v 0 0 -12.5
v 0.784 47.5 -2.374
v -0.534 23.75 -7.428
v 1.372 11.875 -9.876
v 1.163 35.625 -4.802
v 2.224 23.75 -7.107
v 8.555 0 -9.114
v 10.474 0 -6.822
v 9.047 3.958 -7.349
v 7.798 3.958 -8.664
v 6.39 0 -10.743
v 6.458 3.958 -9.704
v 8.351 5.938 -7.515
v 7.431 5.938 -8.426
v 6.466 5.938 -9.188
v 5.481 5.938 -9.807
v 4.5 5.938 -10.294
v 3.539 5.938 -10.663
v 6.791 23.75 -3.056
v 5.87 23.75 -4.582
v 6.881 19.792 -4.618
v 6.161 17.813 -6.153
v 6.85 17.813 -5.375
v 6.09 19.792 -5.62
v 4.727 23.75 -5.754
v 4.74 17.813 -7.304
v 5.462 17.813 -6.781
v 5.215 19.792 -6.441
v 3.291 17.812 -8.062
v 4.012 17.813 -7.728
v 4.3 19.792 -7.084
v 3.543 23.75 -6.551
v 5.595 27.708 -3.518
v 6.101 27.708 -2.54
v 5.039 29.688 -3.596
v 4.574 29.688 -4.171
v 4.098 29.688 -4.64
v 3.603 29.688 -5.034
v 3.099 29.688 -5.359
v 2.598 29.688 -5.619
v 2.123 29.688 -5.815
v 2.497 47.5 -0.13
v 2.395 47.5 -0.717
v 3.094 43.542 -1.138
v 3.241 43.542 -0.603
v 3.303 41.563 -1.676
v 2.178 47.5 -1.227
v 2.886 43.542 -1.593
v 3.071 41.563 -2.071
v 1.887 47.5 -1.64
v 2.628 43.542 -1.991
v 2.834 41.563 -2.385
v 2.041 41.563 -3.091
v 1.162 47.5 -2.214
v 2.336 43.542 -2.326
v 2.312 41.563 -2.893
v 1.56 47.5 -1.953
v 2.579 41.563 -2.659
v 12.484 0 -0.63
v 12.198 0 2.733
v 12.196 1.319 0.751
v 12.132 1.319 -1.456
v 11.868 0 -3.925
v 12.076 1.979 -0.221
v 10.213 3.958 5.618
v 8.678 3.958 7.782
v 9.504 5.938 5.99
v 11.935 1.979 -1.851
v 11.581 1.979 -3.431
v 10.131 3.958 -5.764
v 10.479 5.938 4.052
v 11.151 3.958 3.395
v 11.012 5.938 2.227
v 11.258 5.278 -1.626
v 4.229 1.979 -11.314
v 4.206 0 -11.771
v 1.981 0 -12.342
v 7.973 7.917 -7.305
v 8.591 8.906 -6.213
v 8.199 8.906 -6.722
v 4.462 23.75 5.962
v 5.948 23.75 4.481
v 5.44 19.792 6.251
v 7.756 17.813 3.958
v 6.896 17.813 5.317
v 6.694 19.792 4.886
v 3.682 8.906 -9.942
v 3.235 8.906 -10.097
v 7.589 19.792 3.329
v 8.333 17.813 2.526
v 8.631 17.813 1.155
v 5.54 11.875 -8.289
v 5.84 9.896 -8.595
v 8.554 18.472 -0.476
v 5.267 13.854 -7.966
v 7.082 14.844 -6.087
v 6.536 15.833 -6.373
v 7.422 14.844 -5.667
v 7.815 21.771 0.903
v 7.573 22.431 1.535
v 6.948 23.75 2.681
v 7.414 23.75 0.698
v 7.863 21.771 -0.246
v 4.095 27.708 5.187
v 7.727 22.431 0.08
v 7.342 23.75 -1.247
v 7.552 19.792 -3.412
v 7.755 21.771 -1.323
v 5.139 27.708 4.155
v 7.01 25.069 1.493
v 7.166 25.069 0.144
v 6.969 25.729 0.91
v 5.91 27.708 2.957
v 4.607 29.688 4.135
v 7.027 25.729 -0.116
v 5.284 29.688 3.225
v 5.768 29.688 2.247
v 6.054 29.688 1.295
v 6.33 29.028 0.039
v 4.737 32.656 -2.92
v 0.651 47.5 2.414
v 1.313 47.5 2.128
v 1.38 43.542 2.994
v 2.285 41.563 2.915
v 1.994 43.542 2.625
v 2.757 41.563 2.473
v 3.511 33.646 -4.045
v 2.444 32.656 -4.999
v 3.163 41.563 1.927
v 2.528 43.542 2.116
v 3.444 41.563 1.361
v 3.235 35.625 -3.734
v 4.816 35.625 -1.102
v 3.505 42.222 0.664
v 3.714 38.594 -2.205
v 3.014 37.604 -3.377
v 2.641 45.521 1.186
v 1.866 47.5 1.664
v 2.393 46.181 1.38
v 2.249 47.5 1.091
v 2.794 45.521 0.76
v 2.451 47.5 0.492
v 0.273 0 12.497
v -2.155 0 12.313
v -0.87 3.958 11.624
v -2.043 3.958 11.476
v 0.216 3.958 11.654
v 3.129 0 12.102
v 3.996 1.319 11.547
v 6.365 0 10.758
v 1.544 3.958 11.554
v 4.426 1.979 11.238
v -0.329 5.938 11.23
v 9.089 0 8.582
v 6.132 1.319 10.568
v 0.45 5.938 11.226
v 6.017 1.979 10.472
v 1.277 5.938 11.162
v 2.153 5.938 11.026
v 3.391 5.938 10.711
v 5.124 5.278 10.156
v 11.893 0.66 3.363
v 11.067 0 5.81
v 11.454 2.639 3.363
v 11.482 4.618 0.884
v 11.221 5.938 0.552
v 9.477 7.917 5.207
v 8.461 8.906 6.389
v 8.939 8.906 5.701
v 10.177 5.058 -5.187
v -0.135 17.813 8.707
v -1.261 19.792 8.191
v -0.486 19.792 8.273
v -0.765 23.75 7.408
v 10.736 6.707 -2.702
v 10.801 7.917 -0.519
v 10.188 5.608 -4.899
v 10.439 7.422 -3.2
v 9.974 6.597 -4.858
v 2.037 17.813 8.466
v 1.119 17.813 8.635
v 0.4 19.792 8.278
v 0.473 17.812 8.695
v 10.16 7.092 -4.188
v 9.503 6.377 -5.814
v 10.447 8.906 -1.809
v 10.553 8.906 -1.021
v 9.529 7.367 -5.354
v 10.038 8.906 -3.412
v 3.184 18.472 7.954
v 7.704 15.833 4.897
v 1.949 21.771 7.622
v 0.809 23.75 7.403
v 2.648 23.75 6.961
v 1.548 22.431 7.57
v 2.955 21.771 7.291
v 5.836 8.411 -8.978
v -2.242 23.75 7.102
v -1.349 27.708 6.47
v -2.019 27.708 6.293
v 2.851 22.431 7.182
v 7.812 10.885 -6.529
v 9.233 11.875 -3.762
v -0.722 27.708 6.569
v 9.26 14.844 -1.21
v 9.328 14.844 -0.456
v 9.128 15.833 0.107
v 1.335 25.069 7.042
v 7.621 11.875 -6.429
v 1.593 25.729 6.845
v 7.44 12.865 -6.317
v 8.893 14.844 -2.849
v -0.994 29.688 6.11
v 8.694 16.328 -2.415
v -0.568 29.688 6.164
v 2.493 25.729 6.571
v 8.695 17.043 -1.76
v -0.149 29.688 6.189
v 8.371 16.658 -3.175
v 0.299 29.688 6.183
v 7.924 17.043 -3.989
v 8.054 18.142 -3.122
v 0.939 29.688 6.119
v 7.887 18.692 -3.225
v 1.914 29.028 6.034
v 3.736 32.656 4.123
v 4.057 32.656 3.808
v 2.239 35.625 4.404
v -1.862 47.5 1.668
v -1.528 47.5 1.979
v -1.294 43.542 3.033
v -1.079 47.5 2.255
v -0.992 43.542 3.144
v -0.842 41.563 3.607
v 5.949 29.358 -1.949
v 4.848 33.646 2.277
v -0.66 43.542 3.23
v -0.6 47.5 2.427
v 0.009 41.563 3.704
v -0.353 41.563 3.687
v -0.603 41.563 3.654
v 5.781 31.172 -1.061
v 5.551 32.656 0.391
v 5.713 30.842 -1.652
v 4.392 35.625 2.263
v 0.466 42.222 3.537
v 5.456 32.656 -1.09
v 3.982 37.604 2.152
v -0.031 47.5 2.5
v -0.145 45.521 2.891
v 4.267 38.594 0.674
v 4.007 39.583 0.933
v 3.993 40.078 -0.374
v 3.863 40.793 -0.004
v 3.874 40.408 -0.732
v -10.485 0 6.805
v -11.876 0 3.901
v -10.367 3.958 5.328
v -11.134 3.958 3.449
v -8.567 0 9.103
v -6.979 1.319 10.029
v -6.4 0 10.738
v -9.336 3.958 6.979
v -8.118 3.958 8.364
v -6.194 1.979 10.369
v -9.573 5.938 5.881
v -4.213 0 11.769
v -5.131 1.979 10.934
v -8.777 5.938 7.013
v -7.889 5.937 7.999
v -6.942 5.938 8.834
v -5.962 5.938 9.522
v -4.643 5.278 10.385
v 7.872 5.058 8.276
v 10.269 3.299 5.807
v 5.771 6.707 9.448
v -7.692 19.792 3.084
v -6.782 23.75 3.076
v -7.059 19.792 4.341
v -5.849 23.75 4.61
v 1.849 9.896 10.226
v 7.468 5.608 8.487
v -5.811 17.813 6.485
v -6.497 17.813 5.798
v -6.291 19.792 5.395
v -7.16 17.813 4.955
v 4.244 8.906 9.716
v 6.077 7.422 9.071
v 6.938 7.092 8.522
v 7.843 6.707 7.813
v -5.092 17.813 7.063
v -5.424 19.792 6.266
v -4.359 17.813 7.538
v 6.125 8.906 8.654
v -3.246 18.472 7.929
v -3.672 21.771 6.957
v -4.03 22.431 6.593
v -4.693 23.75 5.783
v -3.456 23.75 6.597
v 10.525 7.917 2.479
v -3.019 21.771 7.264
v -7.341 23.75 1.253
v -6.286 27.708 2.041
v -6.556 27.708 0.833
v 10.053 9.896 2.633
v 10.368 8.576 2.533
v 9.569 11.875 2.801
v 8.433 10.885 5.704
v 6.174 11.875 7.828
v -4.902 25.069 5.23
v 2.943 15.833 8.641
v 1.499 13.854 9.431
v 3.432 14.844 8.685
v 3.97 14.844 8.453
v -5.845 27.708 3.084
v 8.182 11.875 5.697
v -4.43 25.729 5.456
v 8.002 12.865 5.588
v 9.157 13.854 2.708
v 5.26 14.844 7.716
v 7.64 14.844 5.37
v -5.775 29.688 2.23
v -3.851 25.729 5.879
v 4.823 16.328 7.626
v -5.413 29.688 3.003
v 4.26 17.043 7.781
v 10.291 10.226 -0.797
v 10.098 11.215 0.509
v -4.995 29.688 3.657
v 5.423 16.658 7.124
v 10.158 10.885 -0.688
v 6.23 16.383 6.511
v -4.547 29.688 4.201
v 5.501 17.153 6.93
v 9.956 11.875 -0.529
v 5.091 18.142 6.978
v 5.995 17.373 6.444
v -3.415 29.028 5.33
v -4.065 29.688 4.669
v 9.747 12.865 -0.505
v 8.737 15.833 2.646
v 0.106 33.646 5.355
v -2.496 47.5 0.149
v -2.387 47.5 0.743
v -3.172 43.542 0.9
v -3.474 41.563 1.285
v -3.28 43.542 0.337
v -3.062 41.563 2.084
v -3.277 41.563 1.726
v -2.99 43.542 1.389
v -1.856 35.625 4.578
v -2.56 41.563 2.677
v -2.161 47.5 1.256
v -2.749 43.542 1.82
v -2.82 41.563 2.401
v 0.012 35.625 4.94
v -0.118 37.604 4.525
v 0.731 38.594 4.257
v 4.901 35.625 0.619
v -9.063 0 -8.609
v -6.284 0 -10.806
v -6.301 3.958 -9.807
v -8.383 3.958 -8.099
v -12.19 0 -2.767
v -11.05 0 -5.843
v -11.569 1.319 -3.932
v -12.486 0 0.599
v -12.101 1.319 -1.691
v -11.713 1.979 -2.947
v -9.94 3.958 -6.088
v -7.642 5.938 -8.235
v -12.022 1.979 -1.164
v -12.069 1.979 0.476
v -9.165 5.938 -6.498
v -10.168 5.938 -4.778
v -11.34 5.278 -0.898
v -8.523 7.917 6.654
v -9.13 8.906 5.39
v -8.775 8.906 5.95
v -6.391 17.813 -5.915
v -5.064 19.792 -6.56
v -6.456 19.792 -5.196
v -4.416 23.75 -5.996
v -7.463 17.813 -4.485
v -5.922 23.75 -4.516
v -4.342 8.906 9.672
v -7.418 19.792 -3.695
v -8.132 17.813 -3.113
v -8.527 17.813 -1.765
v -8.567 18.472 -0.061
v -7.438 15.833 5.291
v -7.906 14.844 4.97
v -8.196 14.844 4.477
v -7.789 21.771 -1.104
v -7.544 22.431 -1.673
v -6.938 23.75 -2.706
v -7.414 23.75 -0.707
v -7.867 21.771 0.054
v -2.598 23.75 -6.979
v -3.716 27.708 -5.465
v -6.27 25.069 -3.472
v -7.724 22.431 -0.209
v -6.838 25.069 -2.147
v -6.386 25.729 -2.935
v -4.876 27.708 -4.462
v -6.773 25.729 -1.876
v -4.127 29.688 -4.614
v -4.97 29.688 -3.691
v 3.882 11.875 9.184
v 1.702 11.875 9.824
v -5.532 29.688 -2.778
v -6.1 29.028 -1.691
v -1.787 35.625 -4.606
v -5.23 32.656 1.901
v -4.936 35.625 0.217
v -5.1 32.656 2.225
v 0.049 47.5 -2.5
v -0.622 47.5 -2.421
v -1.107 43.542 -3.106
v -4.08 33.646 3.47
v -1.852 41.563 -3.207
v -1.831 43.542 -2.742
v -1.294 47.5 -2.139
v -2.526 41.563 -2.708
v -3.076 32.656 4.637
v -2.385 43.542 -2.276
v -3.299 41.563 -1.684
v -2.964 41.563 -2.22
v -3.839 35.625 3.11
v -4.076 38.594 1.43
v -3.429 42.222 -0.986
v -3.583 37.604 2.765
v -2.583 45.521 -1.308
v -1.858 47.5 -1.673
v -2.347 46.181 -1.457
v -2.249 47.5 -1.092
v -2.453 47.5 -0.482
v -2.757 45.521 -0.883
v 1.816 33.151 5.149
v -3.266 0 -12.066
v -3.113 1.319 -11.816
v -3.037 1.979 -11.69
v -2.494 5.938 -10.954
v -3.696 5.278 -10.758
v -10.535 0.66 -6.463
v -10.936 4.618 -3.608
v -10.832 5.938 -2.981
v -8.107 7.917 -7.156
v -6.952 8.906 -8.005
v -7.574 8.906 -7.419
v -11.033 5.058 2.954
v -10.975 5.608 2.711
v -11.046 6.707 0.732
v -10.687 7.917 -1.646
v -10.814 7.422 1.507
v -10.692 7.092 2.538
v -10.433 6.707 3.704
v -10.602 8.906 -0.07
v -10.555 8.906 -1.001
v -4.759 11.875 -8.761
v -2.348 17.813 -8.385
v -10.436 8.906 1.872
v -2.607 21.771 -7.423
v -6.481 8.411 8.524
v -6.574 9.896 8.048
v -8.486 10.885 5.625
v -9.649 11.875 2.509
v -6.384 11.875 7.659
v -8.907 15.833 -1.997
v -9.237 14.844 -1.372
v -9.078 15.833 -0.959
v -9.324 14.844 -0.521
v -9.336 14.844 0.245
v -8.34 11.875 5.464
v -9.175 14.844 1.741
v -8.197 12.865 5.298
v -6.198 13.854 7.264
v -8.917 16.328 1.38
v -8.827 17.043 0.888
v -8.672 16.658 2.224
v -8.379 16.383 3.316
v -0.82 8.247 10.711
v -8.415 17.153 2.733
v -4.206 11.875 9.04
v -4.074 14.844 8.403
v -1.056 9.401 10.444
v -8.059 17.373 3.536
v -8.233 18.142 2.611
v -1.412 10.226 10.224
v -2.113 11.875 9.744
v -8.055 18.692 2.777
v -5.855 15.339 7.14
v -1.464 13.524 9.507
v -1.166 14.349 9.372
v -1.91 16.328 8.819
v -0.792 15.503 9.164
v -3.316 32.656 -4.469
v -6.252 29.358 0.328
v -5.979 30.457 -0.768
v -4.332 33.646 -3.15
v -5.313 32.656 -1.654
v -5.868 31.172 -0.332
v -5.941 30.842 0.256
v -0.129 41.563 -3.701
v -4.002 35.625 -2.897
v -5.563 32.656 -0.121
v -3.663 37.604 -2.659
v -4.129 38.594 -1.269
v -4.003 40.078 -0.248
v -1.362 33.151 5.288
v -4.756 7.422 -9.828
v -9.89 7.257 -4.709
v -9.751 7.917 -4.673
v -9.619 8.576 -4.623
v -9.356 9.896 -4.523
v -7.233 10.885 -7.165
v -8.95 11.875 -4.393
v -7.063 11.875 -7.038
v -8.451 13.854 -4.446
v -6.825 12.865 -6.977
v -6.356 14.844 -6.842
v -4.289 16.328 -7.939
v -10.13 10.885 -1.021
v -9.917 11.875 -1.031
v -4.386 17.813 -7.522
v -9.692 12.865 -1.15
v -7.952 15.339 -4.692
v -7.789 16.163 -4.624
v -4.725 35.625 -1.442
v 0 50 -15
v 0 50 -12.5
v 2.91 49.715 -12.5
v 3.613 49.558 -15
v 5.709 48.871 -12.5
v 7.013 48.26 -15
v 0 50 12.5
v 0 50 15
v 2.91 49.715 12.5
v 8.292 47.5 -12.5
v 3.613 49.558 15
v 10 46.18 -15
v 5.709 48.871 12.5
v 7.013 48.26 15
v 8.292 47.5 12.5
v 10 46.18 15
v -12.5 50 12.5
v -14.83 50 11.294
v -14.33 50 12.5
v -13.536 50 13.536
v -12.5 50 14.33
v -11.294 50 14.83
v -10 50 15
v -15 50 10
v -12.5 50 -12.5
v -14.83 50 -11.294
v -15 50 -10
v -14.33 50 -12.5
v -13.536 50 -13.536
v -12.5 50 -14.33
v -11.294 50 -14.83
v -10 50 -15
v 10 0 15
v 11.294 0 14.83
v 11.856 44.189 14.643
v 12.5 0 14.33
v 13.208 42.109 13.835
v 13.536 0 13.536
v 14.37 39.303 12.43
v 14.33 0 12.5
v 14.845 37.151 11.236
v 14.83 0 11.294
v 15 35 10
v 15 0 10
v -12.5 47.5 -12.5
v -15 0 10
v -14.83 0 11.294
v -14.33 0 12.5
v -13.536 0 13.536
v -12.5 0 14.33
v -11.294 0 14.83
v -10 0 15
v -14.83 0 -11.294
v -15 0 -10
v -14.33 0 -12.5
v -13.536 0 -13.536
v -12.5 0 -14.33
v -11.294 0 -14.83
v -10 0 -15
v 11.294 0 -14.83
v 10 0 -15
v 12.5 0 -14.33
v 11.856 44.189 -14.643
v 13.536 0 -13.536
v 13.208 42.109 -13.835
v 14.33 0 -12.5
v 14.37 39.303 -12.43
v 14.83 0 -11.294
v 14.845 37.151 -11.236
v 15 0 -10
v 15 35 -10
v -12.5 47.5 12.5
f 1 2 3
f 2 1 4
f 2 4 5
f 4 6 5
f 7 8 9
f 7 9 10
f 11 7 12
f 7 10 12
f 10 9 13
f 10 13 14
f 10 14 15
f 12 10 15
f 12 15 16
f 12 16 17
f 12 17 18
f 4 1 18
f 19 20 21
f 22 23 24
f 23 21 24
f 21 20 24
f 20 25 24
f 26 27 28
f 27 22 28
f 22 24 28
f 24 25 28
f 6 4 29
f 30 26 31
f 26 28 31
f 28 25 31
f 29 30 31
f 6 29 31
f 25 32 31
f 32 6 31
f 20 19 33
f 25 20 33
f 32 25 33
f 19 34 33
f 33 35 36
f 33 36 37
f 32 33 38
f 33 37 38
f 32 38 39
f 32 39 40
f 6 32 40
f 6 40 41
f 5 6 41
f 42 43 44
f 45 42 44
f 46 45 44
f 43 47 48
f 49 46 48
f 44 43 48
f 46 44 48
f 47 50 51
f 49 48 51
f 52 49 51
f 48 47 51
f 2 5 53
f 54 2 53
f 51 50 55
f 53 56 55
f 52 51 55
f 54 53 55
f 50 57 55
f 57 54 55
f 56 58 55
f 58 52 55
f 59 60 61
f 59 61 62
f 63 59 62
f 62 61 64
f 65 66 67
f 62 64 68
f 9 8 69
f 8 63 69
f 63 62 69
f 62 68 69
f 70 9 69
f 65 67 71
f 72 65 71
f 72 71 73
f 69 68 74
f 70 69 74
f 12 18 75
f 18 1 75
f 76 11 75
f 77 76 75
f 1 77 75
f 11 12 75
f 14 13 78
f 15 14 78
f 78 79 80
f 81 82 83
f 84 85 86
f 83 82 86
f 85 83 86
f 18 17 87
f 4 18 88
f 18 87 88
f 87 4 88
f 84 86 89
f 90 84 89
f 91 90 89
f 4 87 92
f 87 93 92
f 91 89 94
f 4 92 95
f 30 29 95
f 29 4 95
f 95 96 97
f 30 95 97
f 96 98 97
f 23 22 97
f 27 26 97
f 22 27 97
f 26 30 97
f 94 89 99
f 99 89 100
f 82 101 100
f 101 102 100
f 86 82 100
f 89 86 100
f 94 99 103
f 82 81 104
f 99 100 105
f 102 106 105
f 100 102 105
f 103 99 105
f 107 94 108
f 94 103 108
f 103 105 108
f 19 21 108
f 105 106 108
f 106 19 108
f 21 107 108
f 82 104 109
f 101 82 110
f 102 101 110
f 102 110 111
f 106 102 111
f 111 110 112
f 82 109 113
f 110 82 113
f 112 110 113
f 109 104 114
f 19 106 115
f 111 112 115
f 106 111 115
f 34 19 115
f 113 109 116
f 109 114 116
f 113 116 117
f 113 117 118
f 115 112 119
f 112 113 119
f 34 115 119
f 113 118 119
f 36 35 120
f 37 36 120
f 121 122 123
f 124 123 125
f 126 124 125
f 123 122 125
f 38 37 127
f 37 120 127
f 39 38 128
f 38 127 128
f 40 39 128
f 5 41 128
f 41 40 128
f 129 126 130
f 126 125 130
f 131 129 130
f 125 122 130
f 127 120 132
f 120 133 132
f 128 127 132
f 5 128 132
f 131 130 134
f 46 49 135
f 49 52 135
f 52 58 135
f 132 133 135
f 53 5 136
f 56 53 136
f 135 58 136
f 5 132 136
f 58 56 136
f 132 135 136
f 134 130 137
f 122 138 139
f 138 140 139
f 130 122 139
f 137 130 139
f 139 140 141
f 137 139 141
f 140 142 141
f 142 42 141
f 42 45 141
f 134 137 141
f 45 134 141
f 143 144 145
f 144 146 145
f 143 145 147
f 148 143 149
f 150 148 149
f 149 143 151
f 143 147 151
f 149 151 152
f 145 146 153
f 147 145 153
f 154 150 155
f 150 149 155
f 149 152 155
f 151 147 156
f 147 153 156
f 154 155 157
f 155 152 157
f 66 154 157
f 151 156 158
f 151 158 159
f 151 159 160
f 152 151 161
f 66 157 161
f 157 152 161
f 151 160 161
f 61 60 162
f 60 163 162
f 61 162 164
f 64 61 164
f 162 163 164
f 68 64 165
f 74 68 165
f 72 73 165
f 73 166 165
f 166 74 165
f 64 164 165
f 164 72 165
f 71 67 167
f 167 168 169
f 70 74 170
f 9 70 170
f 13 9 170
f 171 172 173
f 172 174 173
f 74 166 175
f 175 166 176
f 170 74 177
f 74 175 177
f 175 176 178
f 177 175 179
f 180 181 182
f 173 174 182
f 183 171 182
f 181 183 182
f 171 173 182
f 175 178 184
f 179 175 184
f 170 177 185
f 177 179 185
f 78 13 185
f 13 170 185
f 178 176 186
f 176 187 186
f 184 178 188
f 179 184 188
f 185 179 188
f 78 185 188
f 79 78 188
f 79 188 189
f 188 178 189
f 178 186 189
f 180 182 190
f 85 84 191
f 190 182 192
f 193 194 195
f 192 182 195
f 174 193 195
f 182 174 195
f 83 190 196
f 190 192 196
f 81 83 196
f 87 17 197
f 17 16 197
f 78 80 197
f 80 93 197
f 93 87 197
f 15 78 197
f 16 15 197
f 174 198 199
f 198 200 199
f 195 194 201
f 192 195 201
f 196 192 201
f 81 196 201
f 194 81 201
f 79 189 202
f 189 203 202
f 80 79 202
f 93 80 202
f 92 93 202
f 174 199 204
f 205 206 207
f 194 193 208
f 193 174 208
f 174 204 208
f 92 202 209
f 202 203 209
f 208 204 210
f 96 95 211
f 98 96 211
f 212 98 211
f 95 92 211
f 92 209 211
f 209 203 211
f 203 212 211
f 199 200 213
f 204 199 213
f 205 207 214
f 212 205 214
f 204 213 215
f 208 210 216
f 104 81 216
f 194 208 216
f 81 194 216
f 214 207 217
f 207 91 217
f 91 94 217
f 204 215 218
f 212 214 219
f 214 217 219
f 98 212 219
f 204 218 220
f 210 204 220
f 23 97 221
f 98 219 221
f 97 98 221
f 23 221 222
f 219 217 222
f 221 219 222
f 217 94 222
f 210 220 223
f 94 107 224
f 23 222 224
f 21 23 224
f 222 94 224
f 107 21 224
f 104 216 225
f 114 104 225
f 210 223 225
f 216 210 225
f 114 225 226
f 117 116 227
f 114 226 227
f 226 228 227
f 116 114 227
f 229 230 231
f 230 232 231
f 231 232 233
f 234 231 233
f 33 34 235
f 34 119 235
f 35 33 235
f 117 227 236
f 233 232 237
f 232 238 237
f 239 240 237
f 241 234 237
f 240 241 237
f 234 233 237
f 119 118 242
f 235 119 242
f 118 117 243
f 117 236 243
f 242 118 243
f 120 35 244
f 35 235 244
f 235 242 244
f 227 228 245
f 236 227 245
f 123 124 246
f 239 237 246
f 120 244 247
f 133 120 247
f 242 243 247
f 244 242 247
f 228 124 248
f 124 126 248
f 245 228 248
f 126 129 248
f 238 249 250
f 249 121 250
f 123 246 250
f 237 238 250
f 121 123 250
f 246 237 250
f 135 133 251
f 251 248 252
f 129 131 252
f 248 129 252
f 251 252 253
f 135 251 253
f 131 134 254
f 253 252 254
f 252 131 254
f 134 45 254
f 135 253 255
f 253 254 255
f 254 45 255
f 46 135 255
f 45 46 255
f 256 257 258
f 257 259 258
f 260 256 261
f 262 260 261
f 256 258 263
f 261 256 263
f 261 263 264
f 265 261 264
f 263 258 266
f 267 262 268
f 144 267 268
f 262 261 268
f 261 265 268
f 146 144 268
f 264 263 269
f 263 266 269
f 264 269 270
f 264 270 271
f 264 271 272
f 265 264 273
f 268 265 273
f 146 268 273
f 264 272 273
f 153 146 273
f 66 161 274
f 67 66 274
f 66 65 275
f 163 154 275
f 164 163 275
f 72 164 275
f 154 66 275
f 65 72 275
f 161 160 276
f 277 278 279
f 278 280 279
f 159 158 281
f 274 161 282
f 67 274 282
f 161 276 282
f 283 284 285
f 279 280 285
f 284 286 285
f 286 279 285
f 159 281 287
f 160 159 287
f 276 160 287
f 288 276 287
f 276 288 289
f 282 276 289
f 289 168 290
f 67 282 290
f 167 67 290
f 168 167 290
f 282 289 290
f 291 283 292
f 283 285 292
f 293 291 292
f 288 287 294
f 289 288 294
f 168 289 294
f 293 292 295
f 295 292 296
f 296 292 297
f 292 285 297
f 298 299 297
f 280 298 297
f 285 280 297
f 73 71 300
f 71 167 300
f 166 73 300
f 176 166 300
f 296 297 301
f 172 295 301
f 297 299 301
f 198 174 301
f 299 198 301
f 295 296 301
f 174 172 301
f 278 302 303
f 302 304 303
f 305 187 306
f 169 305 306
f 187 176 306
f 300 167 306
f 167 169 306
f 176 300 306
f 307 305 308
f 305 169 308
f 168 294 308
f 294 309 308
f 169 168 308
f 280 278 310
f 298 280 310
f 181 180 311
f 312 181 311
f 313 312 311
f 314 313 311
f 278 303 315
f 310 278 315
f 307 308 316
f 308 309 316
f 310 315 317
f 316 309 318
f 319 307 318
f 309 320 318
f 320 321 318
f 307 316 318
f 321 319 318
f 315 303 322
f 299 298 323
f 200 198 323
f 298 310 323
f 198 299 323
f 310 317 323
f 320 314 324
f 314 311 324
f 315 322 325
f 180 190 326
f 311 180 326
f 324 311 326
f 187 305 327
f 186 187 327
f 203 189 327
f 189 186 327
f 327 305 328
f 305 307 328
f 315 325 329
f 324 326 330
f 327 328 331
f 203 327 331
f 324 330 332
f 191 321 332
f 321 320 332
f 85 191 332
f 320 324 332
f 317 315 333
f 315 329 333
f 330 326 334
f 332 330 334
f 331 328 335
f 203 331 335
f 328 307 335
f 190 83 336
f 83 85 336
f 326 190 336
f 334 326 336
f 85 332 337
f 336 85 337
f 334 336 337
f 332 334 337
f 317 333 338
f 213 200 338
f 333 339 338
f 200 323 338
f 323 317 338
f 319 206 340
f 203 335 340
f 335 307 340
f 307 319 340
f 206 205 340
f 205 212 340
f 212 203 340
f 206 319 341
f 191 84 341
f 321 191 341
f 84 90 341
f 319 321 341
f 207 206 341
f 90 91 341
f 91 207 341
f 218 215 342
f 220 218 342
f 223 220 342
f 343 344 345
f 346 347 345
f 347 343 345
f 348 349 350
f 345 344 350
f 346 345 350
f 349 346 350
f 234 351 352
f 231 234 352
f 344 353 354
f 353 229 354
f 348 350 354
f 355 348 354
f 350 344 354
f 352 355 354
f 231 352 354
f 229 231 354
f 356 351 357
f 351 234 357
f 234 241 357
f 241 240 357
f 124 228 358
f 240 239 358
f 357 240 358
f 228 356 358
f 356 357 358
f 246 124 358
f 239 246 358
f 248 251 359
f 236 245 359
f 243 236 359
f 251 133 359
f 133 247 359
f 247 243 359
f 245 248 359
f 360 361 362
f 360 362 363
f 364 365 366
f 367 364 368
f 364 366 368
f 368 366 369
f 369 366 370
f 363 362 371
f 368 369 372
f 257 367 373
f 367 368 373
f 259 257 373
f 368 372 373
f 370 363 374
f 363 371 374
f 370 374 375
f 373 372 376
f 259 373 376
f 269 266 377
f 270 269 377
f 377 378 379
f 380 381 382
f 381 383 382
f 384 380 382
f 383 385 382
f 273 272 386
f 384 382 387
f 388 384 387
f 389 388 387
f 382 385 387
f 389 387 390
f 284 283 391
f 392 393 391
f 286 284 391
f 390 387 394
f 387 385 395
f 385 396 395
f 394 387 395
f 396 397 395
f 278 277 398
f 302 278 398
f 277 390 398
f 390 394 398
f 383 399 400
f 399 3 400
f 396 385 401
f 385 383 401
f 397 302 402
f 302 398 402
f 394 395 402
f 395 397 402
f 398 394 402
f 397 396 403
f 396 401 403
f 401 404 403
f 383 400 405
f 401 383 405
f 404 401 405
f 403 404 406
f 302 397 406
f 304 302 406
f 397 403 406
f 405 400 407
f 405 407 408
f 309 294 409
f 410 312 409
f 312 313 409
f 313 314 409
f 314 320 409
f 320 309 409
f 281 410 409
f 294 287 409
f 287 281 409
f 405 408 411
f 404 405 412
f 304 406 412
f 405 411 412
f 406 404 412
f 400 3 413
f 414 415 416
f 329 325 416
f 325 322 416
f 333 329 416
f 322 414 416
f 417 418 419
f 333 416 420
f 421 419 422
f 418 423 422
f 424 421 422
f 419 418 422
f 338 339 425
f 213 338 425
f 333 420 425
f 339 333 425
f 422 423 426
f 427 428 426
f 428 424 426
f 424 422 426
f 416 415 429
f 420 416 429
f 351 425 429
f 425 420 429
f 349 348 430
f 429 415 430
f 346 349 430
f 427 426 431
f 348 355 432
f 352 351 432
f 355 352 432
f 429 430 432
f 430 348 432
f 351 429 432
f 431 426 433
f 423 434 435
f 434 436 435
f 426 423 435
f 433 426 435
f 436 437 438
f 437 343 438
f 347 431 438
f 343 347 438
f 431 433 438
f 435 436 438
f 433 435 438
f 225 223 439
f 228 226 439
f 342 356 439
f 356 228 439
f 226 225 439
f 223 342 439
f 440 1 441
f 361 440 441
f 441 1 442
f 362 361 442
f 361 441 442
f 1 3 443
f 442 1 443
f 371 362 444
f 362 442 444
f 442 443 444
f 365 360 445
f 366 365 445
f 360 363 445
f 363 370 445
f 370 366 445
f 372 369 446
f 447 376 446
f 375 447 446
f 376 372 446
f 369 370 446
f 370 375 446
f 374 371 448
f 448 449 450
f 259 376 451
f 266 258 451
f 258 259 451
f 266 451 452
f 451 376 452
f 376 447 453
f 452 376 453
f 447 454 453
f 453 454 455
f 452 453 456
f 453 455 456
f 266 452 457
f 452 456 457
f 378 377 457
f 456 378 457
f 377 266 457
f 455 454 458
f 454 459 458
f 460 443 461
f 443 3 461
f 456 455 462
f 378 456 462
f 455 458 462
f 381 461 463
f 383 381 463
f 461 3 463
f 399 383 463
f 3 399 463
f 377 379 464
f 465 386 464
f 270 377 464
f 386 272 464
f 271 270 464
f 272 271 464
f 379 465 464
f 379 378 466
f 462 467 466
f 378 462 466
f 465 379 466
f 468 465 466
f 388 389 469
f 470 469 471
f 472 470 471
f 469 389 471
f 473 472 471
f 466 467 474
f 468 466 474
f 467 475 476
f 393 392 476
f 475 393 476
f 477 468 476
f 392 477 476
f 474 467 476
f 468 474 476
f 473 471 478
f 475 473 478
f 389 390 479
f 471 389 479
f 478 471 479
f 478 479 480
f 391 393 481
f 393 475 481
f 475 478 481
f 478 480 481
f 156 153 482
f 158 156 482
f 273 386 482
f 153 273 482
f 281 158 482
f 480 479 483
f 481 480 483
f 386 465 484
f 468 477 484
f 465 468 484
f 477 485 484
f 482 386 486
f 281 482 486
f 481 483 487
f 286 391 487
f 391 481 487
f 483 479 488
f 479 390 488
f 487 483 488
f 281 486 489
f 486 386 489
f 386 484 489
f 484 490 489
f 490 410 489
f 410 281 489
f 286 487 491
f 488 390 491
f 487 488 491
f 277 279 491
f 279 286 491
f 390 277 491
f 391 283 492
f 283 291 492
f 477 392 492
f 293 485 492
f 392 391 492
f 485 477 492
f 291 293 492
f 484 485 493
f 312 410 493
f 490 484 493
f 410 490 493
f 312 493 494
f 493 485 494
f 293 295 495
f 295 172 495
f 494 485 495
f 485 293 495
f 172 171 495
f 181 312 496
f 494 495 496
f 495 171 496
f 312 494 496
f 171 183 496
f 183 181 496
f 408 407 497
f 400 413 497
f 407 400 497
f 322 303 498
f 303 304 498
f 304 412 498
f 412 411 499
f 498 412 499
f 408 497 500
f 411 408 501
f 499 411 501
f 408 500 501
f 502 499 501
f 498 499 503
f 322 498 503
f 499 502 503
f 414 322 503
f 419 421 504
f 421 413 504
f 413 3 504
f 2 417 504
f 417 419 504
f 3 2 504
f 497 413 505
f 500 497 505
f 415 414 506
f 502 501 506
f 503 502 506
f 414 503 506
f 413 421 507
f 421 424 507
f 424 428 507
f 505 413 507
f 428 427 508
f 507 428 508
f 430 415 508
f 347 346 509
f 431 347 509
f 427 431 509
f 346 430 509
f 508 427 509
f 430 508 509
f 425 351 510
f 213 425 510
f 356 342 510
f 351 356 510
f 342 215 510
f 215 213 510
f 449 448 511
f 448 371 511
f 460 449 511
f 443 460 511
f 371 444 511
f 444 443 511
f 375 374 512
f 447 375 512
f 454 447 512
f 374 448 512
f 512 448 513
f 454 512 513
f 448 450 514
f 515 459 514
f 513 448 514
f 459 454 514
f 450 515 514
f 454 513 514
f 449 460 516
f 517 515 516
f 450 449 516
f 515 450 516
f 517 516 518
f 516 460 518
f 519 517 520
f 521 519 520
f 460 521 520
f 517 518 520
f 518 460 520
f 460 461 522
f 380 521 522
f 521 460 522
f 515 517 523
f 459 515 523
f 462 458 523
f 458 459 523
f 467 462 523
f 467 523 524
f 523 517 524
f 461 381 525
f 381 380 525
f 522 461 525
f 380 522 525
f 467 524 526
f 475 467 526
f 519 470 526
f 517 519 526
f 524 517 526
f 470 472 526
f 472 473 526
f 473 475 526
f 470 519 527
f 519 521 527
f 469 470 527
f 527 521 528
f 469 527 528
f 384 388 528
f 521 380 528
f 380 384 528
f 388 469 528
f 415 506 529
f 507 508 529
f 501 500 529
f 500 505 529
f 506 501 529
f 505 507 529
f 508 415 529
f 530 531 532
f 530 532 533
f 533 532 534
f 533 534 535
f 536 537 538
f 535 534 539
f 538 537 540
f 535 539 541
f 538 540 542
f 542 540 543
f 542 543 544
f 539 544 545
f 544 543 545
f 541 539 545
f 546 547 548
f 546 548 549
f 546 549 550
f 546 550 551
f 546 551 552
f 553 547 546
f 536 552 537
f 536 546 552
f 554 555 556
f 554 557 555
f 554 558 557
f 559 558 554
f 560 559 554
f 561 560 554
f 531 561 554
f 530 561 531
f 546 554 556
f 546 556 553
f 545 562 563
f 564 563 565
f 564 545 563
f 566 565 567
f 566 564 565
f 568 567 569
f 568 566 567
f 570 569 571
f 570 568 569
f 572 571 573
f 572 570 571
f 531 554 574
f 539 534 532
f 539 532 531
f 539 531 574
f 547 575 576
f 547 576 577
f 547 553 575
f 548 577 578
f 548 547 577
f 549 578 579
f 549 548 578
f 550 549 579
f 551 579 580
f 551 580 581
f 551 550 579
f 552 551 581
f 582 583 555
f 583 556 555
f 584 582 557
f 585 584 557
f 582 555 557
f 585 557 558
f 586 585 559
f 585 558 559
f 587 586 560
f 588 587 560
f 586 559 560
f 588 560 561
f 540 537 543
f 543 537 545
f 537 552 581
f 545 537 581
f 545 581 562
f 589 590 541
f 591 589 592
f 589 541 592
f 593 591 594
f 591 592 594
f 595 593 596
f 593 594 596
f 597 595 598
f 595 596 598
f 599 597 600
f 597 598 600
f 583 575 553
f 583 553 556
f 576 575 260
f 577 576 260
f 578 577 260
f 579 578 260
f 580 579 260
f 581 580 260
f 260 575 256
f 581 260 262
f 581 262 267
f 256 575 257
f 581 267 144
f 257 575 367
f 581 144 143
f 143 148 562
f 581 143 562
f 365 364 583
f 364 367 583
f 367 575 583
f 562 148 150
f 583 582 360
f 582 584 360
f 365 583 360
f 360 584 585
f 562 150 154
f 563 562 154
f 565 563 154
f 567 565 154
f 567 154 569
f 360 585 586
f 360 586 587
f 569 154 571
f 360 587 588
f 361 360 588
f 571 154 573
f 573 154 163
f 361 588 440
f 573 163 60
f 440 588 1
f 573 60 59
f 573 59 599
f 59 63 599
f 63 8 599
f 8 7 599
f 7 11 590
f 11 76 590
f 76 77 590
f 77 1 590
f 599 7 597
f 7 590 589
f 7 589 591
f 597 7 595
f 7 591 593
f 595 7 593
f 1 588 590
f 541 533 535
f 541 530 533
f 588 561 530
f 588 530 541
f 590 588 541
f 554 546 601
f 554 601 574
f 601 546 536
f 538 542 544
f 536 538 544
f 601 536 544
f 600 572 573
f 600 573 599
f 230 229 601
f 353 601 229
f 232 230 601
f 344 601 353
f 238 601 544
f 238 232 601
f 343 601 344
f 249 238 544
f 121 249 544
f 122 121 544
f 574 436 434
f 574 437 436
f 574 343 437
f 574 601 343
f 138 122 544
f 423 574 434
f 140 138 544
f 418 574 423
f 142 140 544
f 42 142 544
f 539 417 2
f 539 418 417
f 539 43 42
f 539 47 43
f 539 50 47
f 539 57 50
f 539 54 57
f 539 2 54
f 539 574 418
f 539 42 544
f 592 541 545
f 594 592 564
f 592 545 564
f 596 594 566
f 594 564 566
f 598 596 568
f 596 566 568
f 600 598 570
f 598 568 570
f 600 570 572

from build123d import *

# Parameters (mm, degrees)
SKETCH2_W           = 30
SKETCH2_H           = 30
BOSS_EXTRUDE1_DEPTH = 50
SKETCH3_W           = 25
SKETCH3_H           = 25
CUT_EXTRUDE1_DEPTH  = 2.5
FILLET1_R           = 5
CUT_EXTRUDE2_DEPTH  = 61.207972969


with BuildPart() as part:
    # Sketch2 → Boss-Extrude1 (new body)
    with BuildSketch(Plane(origin=(0, 0, 0), x_dir=(1, 0, 0), z_dir=(0, 1, 0))):
        Rectangle(SKETCH2_W, SKETCH2_H)
    extrude(amount=BOSS_EXTRUDE1_DEPTH)

    # Sketch3 → Cut-Extrude1 (cut)
    with BuildSketch(Plane(origin=(0, 50, 0), x_dir=(1, 0, 0), z_dir=(0, 1, 0))):
        Rectangle(SKETCH3_W, SKETCH3_H)
    extrude(amount=-CUT_EXTRUDE1_DEPTH, mode=Mode.SUBTRACT)

    # Fillet1
    fillet1_edges = [part.edges().sort_by_distance(p)[0] for p in [
        (15, 25, 15),
        (-15, 25, 15),
        (-15, 25, -15),
        (15, 25, -15),
    ]]
    fillet(fillet1_edges, radius=FILLET1_R)

    # Cut-Loft2: read off the stored shape, not the designer's step
    # Cut-Loft2: loft between two sections, ruled curve by curve
    cut_loft2_from = [
        Edge.make_bspline([(0, 0, -12.5), (-25, 0, -12.5), (-25, 0, 12.5), (0, 0, 12.5), (25, 0, 12.5), (25, 0, -12.5), (0, 0, -12.5)], [0, 0, 0, 0, 0.5, 0.5, 0.5, 1, 1, 1, 1], 3, [1, 0.333333333, 0.333333333, 1, 0.333333333, 0.333333333, 1]),
    ]
    cut_loft2_to = [
        Edge.make_bspline([(0.784484005, 47.5, -2.373728048), (-3.962972092, 47.5, -3.942696057), (-5.531940101, 47.5, 0.804760039), (-0.784484005, 47.5, 2.373728048), (3.962972092, 47.5, 3.942696057), (5.531940101, 47.5, -0.804760039), (0.784484005, 47.5, -2.373728048)], [0, 0, 0, 0, 0.5, 0.5, 0.5, 1, 1, 1, 1], 3, [1, 0.333333333, 0.333333333, 1, 0.333333333, 0.333333333, 1]),
    ]
    cut_loft2 = Solid(Shell([*[Face.make_surface_from_curves(cut_loft2_from[k], cut_loft2_to[k]) for k in range(1)], Face(Wire(cut_loft2_from)), Face(Wire(cut_loft2_to))]))
    add(cut_loft2, mode=Mode.SUBTRACT)

    # Sketch9 → Cut-Extrude2 (cut, through all)
    with BuildSketch(Plane.XY.offset(15)):
        with BuildLine():
            Line((15, 50), (10, 50))
            Line((10, 50), (10, 46.180339887))
            ThreePointArc((10, 46.180339887), (13.693063938, 41.123724357), (15, 35))
            Line((15, 35), (15, 50))
        make_face()
        with BuildLine():
            Line((10, 50), (0, 50))
            ThreePointArc((0, 50), (5.352331347, 49.012585384), (10, 46.180339887))
            Line((10, 46.180339887), (10, 50))
        make_face()
    extrude(amount=-CUT_EXTRUDE2_DEPTH, mode=Mode.SUBTRACT)


solid = part.part
